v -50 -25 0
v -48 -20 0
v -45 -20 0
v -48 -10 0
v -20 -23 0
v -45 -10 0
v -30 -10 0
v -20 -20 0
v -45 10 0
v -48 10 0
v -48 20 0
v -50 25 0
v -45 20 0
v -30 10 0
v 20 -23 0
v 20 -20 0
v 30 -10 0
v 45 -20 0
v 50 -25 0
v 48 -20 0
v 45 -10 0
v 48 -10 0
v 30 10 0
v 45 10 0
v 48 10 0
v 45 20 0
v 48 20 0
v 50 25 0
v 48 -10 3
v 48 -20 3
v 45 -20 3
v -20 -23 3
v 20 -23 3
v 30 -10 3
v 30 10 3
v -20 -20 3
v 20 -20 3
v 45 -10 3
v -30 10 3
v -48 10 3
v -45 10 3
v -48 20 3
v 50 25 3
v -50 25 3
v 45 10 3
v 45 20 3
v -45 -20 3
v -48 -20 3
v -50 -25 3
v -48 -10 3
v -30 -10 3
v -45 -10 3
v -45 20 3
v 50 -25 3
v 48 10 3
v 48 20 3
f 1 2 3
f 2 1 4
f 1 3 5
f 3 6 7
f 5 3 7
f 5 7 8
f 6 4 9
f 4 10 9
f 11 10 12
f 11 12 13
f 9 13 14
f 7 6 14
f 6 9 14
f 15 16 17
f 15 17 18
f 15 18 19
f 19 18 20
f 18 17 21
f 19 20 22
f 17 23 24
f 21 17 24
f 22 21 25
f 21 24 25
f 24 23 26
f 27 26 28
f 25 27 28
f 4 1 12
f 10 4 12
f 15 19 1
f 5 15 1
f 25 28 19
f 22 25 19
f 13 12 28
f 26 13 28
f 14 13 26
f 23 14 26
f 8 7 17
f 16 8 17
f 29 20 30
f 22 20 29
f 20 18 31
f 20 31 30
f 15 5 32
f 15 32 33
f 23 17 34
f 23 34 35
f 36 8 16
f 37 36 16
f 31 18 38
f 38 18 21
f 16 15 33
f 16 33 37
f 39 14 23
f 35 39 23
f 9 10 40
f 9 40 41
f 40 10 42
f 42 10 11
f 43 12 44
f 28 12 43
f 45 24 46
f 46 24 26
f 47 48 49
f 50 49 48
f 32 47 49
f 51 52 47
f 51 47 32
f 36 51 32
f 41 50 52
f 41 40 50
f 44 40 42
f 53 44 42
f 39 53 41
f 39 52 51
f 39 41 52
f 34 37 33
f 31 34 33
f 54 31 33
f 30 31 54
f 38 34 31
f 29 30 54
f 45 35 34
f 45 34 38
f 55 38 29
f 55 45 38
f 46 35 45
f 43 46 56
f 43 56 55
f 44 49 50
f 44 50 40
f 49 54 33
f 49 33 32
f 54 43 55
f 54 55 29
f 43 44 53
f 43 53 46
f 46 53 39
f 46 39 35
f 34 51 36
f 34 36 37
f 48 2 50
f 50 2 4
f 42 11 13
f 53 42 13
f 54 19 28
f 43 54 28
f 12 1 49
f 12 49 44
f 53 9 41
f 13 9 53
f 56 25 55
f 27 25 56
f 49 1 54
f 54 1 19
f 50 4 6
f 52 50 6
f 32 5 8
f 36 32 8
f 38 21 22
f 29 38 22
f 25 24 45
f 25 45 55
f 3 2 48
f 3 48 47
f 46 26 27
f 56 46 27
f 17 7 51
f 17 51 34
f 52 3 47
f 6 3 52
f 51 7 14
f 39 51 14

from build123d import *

# Parameters (mm, degrees)
SKETCH3_W           = 100
SKETCH3_H           = 50
SKETCH3_W_2         = 40
SKETCH3_H_2         = 3
SKETCH3_W_3         = 3
SKETCH3_H_3         = 10
SKETCH3_W_4         = 60
SKETCH3_H_4         = 20
BOSS_EXTRUDE2_DEPTH = 3


with BuildPart() as part:
    # Sketch3 → Boss-Extrude2 (new body)
    with BuildSketch(Plane.XY):
        Rectangle(SKETCH3_W, SKETCH3_H)
        with Locations((0, -21.5)):
            Rectangle(SKETCH3_W_2, SKETCH3_H_2, mode=Mode.SUBTRACT)
        with Locations((-46.5, 15)):
            Rectangle(SKETCH3_W_3, SKETCH3_H_3, mode=Mode.SUBTRACT)
        Rectangle(SKETCH3_W_4, SKETCH3_H_4, mode=Mode.SUBTRACT)
        with Locations((46.5, 15)):
            Rectangle(SKETCH3_W_3, SKETCH3_H_3, mode=Mode.SUBTRACT)
        with Locations((46.5, -15)):
            Rectangle(SKETCH3_W_3, SKETCH3_H_3, mode=Mode.SUBTRACT)
        with Locations((-46.5, -15)):
            Rectangle(SKETCH3_W_3, SKETCH3_H_3, mode=Mode.SUBTRACT)
    extrude(amount=BOSS_EXTRUDE2_DEPTH)


solid = part.part
